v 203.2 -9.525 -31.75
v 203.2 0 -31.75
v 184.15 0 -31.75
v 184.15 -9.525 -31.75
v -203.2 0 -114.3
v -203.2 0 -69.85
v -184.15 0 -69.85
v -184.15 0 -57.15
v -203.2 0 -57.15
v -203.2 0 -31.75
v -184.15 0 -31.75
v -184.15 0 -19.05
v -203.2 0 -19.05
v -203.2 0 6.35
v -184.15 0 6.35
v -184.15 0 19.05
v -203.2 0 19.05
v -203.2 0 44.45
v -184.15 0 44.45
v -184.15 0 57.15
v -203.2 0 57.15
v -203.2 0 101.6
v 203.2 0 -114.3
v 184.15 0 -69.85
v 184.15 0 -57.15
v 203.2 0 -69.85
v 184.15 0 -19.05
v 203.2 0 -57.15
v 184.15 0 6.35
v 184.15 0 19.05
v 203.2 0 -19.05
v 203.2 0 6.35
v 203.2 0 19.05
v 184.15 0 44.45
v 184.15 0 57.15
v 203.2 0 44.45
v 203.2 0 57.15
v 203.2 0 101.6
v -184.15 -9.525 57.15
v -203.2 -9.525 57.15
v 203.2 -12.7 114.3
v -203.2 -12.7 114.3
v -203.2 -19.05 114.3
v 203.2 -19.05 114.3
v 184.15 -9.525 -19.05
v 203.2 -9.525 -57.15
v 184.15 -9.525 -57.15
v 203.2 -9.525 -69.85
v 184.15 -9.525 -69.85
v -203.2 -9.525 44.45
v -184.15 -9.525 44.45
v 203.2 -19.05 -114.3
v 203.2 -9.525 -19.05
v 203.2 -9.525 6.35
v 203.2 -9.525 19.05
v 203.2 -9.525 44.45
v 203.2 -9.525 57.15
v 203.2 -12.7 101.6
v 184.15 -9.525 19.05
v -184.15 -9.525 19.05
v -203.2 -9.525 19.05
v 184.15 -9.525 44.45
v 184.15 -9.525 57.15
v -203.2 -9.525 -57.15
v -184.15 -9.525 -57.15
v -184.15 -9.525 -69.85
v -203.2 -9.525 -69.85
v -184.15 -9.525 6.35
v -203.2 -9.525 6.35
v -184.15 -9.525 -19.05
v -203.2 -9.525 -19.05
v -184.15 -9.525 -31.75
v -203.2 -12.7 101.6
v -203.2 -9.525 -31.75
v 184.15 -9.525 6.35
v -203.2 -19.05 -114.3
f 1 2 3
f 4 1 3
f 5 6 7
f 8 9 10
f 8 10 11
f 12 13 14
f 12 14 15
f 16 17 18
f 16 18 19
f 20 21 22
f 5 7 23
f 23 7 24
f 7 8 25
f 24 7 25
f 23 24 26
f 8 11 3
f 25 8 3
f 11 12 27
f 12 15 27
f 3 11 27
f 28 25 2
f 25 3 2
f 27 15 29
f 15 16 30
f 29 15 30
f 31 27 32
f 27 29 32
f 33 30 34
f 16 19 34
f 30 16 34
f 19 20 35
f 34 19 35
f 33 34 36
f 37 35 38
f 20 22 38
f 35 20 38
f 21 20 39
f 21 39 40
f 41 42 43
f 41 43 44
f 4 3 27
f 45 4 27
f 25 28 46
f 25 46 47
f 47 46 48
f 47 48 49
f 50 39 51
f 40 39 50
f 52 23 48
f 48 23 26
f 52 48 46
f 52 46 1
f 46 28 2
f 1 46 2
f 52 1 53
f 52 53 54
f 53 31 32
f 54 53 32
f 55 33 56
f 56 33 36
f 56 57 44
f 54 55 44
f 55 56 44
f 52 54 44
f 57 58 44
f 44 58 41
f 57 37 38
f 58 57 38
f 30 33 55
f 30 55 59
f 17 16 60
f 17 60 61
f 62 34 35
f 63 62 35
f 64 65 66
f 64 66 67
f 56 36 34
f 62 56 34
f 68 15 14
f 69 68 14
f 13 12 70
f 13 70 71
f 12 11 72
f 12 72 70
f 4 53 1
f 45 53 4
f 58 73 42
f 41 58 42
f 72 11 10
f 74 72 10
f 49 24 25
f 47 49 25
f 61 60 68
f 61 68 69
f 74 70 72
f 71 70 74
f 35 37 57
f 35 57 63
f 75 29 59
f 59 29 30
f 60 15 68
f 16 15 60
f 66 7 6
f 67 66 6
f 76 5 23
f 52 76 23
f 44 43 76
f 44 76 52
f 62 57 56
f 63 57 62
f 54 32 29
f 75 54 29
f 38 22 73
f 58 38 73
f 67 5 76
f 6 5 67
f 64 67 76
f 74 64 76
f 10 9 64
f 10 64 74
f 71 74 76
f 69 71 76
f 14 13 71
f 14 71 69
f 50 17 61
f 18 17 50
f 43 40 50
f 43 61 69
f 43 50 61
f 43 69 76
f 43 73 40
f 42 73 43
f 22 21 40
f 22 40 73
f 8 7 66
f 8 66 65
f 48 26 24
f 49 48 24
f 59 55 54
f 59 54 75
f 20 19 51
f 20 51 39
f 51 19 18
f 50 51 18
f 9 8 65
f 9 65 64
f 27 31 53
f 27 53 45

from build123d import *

# Parameters (mm, degrees)
F0_W     = 406.4
F0_H     = 228.6
F1_DEPTH = 19.05
F2_W     = 12.7
F2_H     = 12.7
F3_DEPTH = 406.4
F4_W     = 19.05
F4_H     = 12.7
F5_DEPTH = 9.525


with BuildPart() as f1:
    # F0 (on Front) → F1 (new body)
    with BuildSketch(Plane.XZ):
        Rectangle(F0_W, F0_H)
    extrude(amount=F1_DEPTH)

    # F2 (on face) → F3 (cut, through all)
    with BuildSketch(Plane(origin=(-203.2, 0, 0), x_dir=(0, -1, 0), z_dir=(-1, 0, 0))):
        with Locations((6.35, 107.95)):
            Rectangle(F2_W, F2_H)
    extrude(amount=-F3_DEPTH, mode=Mode.SUBTRACT)

    # F4 (on face) → F5 (cut)
    with BuildSketch(Plane(origin=(0, 0, 0), x_dir=(-1, 0, 0), z_dir=(0, 1, 0))):
        with Locations((-193.675, 50.8)):
            Rectangle(F4_W, F4_H)
        with Locations((-193.675, 12.7)):
            Rectangle(F4_W, F4_H)
        with Locations((-193.675, -25.4)):
            Rectangle(F4_W, F4_H)
        with Locations((-193.675, -63.5)):
            Rectangle(F4_W, F4_H)
        with Locations((193.675, 50.8)):
            Rectangle(F4_W, F4_H)
        with Locations((193.675, 12.7)):
            Rectangle(F4_W, F4_H)
        with Locations((193.675, -25.4)):
            Rectangle(F4_W, F4_H)
        with Locations((193.675, -63.5)):
            Rectangle(F4_W, F4_H)
    extrude(amount=-F5_DEPTH, mode=Mode.SUBTRACT)


solid = f1.part
